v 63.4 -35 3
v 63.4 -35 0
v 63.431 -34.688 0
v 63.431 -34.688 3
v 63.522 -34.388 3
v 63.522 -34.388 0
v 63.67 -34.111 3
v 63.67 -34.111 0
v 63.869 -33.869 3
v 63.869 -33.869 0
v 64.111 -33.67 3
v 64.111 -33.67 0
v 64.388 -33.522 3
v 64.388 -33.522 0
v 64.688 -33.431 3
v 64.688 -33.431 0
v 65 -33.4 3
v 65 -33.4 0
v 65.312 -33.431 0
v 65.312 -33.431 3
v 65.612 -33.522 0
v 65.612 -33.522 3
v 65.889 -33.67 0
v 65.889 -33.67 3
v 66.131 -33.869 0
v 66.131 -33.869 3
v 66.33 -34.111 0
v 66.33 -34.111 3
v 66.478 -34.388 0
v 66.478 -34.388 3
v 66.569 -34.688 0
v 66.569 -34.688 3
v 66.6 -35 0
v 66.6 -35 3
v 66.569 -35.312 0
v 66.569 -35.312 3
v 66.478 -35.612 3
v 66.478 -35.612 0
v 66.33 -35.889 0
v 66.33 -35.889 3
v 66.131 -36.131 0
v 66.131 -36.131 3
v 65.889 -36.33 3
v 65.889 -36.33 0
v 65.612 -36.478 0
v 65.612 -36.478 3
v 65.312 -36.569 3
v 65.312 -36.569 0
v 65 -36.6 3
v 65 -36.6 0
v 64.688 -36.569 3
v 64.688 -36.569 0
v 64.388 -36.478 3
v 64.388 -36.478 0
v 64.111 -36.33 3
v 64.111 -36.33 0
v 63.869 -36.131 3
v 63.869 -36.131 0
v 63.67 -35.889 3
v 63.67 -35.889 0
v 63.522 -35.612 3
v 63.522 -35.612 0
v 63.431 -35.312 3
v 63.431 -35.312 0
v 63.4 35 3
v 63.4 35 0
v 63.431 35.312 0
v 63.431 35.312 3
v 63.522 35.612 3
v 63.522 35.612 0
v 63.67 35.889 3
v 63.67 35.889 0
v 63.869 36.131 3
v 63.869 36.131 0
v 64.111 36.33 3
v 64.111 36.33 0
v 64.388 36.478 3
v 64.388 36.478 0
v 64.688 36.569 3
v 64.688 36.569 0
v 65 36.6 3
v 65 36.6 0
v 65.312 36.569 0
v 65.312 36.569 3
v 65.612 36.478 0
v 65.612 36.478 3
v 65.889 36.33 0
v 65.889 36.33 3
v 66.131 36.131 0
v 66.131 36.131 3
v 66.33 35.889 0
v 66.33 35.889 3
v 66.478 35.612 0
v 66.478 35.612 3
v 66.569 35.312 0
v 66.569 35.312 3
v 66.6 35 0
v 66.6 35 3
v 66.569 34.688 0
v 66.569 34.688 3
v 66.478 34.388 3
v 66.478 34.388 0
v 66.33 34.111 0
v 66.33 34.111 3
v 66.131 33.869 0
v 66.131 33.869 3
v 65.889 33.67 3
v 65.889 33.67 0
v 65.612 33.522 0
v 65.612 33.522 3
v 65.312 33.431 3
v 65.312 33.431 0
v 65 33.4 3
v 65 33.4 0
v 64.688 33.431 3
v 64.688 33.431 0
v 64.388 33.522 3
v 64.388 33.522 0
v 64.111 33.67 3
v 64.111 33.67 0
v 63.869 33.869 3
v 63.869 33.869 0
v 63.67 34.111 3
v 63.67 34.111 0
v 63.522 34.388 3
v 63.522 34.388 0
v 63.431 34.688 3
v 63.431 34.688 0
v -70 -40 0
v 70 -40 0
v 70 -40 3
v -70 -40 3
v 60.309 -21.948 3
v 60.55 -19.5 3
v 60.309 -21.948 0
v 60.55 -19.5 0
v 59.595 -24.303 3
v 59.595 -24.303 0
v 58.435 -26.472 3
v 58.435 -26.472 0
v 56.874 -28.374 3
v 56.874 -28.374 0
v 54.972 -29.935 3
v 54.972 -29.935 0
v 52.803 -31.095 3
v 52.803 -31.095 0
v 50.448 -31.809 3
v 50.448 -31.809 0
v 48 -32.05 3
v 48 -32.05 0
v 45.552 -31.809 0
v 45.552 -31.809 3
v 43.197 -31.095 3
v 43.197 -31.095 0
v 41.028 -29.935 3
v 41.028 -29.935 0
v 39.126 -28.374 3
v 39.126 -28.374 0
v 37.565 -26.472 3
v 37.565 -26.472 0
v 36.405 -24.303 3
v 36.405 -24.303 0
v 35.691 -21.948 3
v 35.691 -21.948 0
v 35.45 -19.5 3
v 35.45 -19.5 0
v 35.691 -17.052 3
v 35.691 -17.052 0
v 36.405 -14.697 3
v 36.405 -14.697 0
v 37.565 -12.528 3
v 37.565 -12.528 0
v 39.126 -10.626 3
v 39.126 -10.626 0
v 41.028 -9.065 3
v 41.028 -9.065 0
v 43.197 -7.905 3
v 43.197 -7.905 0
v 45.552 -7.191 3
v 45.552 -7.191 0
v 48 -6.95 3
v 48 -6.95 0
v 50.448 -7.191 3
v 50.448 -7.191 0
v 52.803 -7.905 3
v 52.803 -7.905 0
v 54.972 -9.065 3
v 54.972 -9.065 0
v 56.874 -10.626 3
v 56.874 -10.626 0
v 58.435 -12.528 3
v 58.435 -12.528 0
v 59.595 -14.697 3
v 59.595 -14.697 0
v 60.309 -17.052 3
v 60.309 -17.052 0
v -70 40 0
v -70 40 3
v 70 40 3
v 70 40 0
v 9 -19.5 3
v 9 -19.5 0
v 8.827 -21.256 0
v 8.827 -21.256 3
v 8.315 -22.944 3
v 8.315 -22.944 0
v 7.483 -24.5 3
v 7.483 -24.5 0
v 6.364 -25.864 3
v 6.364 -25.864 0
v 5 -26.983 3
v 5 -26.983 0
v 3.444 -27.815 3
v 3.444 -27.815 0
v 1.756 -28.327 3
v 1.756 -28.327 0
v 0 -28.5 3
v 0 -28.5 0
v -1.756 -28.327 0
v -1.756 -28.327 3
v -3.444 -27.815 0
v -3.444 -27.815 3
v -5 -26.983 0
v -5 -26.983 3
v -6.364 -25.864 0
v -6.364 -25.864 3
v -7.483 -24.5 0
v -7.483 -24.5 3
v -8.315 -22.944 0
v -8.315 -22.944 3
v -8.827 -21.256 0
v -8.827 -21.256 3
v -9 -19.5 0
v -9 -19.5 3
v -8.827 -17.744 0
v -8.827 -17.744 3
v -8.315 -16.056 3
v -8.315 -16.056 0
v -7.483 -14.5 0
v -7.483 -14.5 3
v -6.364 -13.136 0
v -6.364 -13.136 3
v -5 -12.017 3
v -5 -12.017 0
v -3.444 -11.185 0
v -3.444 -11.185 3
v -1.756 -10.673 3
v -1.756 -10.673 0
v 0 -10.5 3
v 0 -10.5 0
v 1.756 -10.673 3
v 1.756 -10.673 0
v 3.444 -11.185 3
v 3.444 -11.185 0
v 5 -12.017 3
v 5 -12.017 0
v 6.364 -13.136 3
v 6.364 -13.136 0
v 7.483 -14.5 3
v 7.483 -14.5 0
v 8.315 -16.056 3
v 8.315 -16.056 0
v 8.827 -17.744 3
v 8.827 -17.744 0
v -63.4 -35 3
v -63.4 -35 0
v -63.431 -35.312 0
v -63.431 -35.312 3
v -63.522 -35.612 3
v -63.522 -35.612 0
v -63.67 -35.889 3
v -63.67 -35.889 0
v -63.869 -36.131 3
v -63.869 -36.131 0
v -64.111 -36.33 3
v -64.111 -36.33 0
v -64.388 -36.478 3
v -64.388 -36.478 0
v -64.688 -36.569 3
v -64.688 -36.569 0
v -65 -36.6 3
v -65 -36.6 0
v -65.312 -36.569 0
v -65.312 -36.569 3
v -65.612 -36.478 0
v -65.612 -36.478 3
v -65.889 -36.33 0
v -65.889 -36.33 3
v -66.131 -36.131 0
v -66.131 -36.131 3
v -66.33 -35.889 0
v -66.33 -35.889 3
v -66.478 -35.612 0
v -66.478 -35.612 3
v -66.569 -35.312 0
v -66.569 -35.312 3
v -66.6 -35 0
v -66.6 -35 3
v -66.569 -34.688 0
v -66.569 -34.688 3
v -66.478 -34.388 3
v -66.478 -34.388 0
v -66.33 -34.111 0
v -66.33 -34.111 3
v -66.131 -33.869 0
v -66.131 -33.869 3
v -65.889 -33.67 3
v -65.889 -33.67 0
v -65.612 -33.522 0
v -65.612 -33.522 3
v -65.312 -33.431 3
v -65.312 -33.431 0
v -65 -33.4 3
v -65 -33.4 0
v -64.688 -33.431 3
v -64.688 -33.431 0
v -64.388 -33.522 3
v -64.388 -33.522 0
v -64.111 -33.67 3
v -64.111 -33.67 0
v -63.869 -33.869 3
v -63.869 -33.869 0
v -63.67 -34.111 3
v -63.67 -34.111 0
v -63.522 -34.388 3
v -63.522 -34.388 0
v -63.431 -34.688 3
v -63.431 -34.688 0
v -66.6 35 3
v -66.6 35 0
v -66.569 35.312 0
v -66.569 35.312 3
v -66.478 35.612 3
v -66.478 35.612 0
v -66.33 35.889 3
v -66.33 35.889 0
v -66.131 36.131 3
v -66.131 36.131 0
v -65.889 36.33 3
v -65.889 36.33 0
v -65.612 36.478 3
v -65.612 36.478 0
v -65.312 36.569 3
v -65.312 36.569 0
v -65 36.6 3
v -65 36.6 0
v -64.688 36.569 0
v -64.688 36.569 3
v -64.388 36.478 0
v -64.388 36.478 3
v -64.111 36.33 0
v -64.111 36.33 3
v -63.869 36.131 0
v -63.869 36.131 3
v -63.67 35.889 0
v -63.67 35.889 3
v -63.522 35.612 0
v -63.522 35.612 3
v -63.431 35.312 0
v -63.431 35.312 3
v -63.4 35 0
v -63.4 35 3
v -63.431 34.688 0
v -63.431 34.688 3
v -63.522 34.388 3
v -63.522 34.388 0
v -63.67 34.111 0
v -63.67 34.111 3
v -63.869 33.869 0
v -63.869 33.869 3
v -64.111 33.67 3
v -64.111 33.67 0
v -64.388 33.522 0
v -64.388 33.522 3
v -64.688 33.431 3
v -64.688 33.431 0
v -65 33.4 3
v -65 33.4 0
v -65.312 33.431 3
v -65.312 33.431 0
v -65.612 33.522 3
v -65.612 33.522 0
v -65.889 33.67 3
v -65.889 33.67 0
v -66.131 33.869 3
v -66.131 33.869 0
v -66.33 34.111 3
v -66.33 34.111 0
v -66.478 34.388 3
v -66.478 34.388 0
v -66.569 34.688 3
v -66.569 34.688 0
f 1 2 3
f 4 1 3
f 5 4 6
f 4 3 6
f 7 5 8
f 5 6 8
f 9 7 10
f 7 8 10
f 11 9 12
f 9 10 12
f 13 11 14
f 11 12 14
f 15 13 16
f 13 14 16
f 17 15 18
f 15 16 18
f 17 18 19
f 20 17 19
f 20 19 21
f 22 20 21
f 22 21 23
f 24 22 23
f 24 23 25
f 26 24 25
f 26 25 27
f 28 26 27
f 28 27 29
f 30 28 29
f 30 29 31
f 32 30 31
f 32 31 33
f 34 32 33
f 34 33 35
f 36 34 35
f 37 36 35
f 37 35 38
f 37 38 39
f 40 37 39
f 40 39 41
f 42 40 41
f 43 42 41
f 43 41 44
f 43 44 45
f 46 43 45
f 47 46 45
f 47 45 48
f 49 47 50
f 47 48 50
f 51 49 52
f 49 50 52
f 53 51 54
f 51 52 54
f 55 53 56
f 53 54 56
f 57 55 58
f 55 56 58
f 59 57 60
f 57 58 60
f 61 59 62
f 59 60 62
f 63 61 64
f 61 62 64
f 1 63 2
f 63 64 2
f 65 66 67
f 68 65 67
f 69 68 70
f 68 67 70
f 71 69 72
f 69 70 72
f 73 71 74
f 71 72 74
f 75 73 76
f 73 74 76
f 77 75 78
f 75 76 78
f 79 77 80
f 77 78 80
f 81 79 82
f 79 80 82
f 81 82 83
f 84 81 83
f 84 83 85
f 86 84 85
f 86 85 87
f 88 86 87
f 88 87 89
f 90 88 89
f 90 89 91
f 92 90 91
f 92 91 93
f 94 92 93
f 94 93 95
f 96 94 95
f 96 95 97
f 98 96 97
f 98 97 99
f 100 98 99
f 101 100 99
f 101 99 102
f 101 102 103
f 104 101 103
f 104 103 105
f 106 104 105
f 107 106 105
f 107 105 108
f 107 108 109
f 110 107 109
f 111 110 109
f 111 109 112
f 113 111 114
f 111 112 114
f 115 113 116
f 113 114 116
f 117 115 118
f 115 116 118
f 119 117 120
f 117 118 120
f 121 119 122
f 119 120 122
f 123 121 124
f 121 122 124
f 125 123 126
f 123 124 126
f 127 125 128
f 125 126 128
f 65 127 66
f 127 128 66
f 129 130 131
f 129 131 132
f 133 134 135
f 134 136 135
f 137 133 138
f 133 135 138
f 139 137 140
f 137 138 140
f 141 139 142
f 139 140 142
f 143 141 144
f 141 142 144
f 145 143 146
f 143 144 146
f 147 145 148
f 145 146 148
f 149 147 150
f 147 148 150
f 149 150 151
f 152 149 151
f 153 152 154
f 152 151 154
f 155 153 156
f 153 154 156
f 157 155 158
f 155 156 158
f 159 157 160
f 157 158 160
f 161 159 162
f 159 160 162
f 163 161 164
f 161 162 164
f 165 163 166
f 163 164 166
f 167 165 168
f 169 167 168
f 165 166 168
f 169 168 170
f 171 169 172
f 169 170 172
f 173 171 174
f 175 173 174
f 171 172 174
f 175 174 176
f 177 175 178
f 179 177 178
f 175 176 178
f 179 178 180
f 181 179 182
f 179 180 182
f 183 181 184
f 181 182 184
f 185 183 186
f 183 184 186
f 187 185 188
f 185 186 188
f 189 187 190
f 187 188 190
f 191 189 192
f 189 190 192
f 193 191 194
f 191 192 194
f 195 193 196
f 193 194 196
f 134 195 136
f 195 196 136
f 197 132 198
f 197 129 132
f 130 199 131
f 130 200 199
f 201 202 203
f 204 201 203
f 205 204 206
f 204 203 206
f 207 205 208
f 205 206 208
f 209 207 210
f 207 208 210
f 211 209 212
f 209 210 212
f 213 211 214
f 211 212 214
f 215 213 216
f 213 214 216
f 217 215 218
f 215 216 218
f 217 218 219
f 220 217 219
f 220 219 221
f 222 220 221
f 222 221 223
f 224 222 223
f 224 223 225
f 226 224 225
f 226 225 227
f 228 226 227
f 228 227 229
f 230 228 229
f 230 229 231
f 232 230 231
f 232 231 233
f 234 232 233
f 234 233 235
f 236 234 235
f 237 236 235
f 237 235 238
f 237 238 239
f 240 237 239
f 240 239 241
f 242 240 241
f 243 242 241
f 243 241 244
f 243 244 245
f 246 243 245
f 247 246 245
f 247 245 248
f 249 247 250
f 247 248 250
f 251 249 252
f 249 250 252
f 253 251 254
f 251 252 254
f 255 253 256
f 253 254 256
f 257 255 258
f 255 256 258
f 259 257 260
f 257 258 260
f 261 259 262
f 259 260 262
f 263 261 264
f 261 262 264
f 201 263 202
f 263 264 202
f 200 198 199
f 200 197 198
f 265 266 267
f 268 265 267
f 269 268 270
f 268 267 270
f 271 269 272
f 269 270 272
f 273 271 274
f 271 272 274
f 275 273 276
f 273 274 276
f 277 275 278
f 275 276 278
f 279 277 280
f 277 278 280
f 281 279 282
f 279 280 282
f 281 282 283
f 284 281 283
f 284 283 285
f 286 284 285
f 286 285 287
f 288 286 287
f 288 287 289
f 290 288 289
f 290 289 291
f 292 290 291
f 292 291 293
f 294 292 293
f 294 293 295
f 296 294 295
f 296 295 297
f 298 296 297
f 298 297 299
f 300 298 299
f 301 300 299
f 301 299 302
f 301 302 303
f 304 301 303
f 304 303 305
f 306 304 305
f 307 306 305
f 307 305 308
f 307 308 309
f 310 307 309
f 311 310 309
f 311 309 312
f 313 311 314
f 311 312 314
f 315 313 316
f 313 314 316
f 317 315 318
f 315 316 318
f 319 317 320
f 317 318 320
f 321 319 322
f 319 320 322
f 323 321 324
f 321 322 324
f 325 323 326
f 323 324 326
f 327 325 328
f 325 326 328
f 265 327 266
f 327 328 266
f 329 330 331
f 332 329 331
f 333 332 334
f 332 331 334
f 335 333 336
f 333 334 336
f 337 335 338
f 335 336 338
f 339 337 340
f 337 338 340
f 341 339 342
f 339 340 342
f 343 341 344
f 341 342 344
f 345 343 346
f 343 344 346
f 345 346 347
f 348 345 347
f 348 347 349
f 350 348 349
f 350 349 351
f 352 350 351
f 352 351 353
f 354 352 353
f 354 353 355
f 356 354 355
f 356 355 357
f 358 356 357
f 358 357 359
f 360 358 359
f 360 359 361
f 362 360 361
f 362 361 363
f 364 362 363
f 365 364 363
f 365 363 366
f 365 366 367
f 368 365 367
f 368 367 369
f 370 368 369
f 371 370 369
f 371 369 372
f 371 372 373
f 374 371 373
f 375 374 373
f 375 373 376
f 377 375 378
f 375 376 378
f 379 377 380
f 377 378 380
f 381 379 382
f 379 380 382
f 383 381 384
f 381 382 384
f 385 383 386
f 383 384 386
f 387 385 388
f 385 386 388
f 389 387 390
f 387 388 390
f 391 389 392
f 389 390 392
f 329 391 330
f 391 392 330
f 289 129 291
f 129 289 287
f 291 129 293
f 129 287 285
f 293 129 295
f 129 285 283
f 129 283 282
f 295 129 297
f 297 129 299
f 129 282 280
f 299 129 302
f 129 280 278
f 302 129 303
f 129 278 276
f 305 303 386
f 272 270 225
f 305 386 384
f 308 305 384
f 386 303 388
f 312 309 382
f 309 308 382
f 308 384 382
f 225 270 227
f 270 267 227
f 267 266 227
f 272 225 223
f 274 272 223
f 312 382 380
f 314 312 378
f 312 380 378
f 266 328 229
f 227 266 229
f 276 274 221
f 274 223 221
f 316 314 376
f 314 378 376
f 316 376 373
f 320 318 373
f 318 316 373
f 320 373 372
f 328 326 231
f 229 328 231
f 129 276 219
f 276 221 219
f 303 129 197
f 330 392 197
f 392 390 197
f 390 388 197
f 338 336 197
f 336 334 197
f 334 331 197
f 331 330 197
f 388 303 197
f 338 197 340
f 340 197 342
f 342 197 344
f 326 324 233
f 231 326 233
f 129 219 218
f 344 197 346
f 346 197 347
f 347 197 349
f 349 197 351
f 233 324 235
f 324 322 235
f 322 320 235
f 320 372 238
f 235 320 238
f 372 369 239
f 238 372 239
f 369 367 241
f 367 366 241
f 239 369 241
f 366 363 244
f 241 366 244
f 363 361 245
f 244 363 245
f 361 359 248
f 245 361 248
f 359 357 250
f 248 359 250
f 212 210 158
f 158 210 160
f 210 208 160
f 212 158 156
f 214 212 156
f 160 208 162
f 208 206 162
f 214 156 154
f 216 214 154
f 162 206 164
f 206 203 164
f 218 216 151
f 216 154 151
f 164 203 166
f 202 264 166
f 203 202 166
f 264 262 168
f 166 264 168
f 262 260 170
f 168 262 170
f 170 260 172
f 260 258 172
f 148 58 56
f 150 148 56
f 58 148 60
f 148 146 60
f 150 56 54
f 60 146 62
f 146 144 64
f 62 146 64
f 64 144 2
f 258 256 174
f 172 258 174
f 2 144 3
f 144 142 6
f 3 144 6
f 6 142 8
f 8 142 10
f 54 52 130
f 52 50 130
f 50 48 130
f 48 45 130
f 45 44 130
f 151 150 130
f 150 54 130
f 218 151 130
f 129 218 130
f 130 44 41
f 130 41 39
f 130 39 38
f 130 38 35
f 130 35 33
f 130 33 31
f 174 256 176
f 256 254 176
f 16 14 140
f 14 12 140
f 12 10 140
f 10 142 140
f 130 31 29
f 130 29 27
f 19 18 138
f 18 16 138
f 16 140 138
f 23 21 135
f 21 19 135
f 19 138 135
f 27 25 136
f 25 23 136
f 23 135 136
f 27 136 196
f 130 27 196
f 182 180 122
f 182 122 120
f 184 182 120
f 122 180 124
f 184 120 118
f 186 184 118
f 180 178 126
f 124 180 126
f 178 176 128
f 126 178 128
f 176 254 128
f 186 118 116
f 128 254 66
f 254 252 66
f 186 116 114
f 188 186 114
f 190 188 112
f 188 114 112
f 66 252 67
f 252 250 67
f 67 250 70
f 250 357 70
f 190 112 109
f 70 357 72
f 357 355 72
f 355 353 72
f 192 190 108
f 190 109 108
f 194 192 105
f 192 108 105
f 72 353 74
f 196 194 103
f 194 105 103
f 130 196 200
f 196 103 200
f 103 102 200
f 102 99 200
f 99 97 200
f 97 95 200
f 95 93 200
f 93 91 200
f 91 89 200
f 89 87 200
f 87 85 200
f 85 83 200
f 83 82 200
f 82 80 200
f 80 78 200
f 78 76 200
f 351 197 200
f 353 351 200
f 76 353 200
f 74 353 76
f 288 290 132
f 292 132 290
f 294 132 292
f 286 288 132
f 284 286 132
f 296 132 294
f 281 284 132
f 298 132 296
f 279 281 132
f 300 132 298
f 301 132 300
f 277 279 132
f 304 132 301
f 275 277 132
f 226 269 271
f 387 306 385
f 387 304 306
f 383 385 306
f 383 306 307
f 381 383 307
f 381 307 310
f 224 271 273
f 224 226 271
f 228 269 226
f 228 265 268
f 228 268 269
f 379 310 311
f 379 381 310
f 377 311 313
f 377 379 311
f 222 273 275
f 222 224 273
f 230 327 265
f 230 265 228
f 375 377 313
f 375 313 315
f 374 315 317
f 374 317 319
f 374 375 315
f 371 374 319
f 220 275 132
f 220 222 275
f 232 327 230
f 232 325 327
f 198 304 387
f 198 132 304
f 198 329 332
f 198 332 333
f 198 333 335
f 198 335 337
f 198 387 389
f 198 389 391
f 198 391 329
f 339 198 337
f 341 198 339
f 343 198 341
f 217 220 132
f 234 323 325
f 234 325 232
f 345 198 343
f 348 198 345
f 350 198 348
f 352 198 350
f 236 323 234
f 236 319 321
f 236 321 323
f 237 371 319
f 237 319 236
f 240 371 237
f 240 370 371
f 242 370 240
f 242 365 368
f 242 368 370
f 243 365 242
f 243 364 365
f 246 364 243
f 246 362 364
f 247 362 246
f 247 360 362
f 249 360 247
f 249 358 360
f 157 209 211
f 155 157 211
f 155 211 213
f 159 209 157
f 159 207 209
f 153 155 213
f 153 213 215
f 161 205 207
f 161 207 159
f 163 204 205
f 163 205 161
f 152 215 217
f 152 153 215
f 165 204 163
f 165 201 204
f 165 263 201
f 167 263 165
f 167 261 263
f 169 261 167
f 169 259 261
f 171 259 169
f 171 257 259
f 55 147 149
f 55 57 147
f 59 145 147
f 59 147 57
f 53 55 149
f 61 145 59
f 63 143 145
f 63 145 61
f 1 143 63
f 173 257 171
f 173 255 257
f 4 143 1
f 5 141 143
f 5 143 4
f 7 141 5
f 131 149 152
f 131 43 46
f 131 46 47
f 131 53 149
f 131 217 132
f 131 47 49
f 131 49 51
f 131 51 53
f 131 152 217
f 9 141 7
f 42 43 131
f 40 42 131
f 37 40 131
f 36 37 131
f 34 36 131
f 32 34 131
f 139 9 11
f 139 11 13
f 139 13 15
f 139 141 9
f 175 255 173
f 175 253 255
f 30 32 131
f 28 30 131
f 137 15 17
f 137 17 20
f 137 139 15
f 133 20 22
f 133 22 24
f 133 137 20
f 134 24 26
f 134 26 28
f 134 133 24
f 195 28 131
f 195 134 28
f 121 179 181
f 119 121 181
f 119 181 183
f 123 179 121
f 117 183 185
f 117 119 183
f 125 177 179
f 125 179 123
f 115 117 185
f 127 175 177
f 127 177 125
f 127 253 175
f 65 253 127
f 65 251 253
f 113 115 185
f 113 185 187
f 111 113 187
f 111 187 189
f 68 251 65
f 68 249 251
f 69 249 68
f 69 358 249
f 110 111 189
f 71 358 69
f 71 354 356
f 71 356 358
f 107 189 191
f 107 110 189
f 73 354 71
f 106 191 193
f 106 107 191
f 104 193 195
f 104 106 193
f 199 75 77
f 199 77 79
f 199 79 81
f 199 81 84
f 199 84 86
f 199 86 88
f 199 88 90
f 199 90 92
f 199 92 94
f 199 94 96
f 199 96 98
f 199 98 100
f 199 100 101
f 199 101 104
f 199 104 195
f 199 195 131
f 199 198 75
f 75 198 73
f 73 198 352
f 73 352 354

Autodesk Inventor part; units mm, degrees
ref_plane "YZ Plane" through (0, 0, 0) normal (1, 0, 0) x (0, 1, 0)
ref_plane "XZ Plane" through (0, 0, 0) normal (0, 1, 0) x (-1, 0, 0)
ref_plane "XY Plane" through (0, 0, 0) normal (0, 0, 1) x (1, 0, 0)
sketch "スケッチ1" plane through (0, 0, 0) normal (0, 0, 1) x (1, 0, 0)
  point P0 (0, 0)
sketch "スケッチ2" plane through (0, 0, 0) normal (0, 0, 1) x (1, 0, 0)
  line L0 (70, -40) -> (-70, -40)
  line L1 (-70, -40) -> (-70, 40)
  line L2 (-70, 40) -> (70, 40)
  line L3 (70, 40) -> (70, -40)
  line L4 (70, -40) -> (-70, 40) construction
  line L5 (-70, -40) -> (70, 40) construction
  circle A0 centre (-48, -19.5) radius 6.05
  circle A1 centre (48, -19.5) radius 12.55
  circle A2 centre (48, -19.5) radius 17.5
  circle A3 centre (65.5, -19.5) radius 2.05
  circle A4 centre (48, -2) radius 2.05
  circle A5 centre (30.5, -19.5) radius 2.05
  circle A6 centre (48, -37) radius 2.05
  circle A7 centre (-48, -19.5) radius 9
  circle A8 centre (-57, -19.5) radius 1.6
  circle A9 centre (-48, -28.5) radius 1.6
  circle A10 centre (-39, -19.5) radius 1.6
  circle A11 centre (-48, -10.5) radius 1.6
  line L6 (65, 35) -> (-65, 35)
  line L7 (-65, 35) -> (-65, -35)
  line L8 (-65, -35) -> (65, -35)
  line L9 (65, -35) -> (65, 35)
  line L10 (-65, 35) -> (-65, 35) construction
  line L11 (-66.6, 35) -> (-66.6, 35)
  line L12 (-63.4, 35) -> (-63.4, 35)
  arc A12 (-63.4, 35) -> (-66.6, 35) centre (-65, 35) ccw
  arc A13 (-66.6, 35) -> (-63.4, 35) centre (-65, 35) ccw
  line L13 (-65, 35) -> (-65, 35) construction
  line L14 (-65, -35) -> (-65, -35) construction
  line L15 (-63.4, -35) -> (-63.4, -35)
  line L16 (-66.6, -35) -> (-66.6, -35)
  arc A14 (-66.6, -35) -> (-63.4, -35) centre (-65, -35) ccw
  arc A15 (-63.4, -35) -> (-66.6, -35) centre (-65, -35) ccw
  line L17 (-65, -35) -> (-65, -35) construction
  line L18 (65, 35) -> (65, 35) construction
  line L19 (63.4, 35) -> (63.4, 35)
  line L20 (66.6, 35) -> (66.6, 35)
  arc A16 (66.6, 35) -> (63.4, 35) centre (65, 35) ccw
  arc A17 (63.4, 35) -> (66.6, 35) centre (65, 35) ccw
  line L21 (65, 35) -> (65, 35) construction
  line L22 (65, -35) -> (65, -35) construction
  line L23 (66.6, -35) -> (66.6, -35)
  line L24 (63.4, -35) -> (63.4, -35)
  arc A18 (63.4, -35) -> (66.6, -35) centre (65, -35) ccw
  arc A19 (66.6, -35) -> (63.4, -35) centre (65, -35) ccw
  line L25 (65, -35) -> (65, -35) construction
  line L26 (-70, -19.5) -> (70, -19.5)
  circle A20 centre (0, -19.5) radius 9
  circle A21 centre (0, -19.5) radius 39
  line L27 (-85, 40) -> (85, 40)
  line L28 (85, 40) -> (85, 35)
  line L29 (85, 35) -> (-85, 35)
  line L30 (-85, 35) -> (-85, 40)
  line L31 (-85, 35) -> (0, 0)
  line L32 (0, 0) -> (85, 35)
  line L33 (-70, 0) -> (70, 0)
  line L34 (70, 0) -> (70, -50)
  line L35 (70, -50) -> (-70, -50)
  line L36 (-70, -50) -> (-70, 0)
  point P0 (-65, -35)
  point P1 (65, 35)
  point P2 (65, -35)
  point P3 (-39.1422, -21.0937)
  point P4 (-39.1422, -17.9063)
  point P5 (0, 40)
  point P6 (85, 40)
  point P7 (48.45, -35)
  point P8 (47.55, -35)
  point P9 (-70, 28.8235)
  point P10 (70, 28.8235)
  dimension "d9" = 35
  dimension "d15" = 18
  dimension "d0" = 140
  dimension "d1" = 80
  dimension "d5" = 12.1
  dimension "d6" = 25.1
  dimension "d10" = 4.1
  dimension "d13" = 360
  dimension "d16" = 3.2
  dimension "d19" = 360
  dimension "d21" = 5
  dimension "d22" = 0
  dimension "d23" = 90
  dimension "d24" = 3.2
  dimension "d25" = 0
  dimension "d26" = 90
  dimension "d27" = 3.2
  dimension "d28" = 0
  dimension "d29" = 90
  dimension "d30" = 3.2
  dimension "d31" = 0
  dimension "d32" = 90
  dimension "d33" = 3.2
  dimension "d36" = 20.5
  dimension "d37" = 18
  dimension "d38" = 78
  dimension "d39" = 48
  dimension "d40" = 48
  dimension "d43" = 170
  dimension "d44" = 85
  dimension "d46" = 50
extrude "押し出し1" add sketch "スケッチ2" along normal blind 3 contours L0 A21 L8 A2 A6 A18 A19 L9 A3 L26 L3 | L0 A21 L8 | L26 A3 A2 L9 L33 L3 | L0 L1 L26 L7 A15 A14 L8 A21 | A21 A2 L8 | L8 A21 A10 L26 A20 A5 A2 | L33 L9 L32 L3 | L26 A2 A3 | A3 A2 L26 | L8 A15 L7 L26 A8 A7 A9 A10 A21 | L8 A6 A2 | A2 A21 A1 L26 A3 L9 L8 A6 | A2 A5 L26 A1 A21 | L32 L9 A17 L29 L3 | L33 A4 A21 L32 L9 | L9 A2 A4 L33 | A3 L9 A2 | A2 L26 L9 A3 | A3 L9 L26 A2 | A2 L9 A3 | L1 L33 L7 L26 | A21 L26 A10 | A10 A7 A21 | A6 L8 A2 | A2 A6 | A6 L8 | A5 L26 A2 | A2 L26 A5 | L29 A16 L6 A12 L1 L2 L3 | L32 A21 L31 L7 A13 L6 A17 L9 | L9 A3 L26 A1 A21 A2 A4 | L33 A4 | A4 A2 L33 | L9 L26 A3 | L9 A19 L8 A2 | A3 L26 L9 | L1 L31 L7 L33 | L7 L33 A21 A10 A7 A11 A8 L26 | A10 L26 A7 | A7 A9 A8 L26 A0 A10 | L26 A21 A10 | A10 A21 L33 A2 A5 L26 A20 | L26 A10 A7 | A7 A10 A21 | A6 L8 A2 | L26 A5 A2 | A2 A5 L26 | A5 A2 A21 A1 L26 | L32 L31 A21 | A21 L33 L32 | A4 A2 | A4 A2 A21 L33 | L1 L29 A13 L7 L31 | L7 L31 A21 L33 | L26 A7 A8 | A8 A7 L26 | A9 A7 | A7 A9 | L26 A0 A8 A7 A11 A10 | L31 L33 A21 | A8 L26 A7 | A7 L26 A8 | L26 A0 | A0 L26 | A11 A7 | A7 A11
equation "\"d27\" = d24"
equation "\"d30\" = d24"
equation "\"d33\" = d24"
equation "\"d40\" = d39"
equation "\"d44\" = 0.5 * d43"
properties part number "aaa_small_plate_middle"
